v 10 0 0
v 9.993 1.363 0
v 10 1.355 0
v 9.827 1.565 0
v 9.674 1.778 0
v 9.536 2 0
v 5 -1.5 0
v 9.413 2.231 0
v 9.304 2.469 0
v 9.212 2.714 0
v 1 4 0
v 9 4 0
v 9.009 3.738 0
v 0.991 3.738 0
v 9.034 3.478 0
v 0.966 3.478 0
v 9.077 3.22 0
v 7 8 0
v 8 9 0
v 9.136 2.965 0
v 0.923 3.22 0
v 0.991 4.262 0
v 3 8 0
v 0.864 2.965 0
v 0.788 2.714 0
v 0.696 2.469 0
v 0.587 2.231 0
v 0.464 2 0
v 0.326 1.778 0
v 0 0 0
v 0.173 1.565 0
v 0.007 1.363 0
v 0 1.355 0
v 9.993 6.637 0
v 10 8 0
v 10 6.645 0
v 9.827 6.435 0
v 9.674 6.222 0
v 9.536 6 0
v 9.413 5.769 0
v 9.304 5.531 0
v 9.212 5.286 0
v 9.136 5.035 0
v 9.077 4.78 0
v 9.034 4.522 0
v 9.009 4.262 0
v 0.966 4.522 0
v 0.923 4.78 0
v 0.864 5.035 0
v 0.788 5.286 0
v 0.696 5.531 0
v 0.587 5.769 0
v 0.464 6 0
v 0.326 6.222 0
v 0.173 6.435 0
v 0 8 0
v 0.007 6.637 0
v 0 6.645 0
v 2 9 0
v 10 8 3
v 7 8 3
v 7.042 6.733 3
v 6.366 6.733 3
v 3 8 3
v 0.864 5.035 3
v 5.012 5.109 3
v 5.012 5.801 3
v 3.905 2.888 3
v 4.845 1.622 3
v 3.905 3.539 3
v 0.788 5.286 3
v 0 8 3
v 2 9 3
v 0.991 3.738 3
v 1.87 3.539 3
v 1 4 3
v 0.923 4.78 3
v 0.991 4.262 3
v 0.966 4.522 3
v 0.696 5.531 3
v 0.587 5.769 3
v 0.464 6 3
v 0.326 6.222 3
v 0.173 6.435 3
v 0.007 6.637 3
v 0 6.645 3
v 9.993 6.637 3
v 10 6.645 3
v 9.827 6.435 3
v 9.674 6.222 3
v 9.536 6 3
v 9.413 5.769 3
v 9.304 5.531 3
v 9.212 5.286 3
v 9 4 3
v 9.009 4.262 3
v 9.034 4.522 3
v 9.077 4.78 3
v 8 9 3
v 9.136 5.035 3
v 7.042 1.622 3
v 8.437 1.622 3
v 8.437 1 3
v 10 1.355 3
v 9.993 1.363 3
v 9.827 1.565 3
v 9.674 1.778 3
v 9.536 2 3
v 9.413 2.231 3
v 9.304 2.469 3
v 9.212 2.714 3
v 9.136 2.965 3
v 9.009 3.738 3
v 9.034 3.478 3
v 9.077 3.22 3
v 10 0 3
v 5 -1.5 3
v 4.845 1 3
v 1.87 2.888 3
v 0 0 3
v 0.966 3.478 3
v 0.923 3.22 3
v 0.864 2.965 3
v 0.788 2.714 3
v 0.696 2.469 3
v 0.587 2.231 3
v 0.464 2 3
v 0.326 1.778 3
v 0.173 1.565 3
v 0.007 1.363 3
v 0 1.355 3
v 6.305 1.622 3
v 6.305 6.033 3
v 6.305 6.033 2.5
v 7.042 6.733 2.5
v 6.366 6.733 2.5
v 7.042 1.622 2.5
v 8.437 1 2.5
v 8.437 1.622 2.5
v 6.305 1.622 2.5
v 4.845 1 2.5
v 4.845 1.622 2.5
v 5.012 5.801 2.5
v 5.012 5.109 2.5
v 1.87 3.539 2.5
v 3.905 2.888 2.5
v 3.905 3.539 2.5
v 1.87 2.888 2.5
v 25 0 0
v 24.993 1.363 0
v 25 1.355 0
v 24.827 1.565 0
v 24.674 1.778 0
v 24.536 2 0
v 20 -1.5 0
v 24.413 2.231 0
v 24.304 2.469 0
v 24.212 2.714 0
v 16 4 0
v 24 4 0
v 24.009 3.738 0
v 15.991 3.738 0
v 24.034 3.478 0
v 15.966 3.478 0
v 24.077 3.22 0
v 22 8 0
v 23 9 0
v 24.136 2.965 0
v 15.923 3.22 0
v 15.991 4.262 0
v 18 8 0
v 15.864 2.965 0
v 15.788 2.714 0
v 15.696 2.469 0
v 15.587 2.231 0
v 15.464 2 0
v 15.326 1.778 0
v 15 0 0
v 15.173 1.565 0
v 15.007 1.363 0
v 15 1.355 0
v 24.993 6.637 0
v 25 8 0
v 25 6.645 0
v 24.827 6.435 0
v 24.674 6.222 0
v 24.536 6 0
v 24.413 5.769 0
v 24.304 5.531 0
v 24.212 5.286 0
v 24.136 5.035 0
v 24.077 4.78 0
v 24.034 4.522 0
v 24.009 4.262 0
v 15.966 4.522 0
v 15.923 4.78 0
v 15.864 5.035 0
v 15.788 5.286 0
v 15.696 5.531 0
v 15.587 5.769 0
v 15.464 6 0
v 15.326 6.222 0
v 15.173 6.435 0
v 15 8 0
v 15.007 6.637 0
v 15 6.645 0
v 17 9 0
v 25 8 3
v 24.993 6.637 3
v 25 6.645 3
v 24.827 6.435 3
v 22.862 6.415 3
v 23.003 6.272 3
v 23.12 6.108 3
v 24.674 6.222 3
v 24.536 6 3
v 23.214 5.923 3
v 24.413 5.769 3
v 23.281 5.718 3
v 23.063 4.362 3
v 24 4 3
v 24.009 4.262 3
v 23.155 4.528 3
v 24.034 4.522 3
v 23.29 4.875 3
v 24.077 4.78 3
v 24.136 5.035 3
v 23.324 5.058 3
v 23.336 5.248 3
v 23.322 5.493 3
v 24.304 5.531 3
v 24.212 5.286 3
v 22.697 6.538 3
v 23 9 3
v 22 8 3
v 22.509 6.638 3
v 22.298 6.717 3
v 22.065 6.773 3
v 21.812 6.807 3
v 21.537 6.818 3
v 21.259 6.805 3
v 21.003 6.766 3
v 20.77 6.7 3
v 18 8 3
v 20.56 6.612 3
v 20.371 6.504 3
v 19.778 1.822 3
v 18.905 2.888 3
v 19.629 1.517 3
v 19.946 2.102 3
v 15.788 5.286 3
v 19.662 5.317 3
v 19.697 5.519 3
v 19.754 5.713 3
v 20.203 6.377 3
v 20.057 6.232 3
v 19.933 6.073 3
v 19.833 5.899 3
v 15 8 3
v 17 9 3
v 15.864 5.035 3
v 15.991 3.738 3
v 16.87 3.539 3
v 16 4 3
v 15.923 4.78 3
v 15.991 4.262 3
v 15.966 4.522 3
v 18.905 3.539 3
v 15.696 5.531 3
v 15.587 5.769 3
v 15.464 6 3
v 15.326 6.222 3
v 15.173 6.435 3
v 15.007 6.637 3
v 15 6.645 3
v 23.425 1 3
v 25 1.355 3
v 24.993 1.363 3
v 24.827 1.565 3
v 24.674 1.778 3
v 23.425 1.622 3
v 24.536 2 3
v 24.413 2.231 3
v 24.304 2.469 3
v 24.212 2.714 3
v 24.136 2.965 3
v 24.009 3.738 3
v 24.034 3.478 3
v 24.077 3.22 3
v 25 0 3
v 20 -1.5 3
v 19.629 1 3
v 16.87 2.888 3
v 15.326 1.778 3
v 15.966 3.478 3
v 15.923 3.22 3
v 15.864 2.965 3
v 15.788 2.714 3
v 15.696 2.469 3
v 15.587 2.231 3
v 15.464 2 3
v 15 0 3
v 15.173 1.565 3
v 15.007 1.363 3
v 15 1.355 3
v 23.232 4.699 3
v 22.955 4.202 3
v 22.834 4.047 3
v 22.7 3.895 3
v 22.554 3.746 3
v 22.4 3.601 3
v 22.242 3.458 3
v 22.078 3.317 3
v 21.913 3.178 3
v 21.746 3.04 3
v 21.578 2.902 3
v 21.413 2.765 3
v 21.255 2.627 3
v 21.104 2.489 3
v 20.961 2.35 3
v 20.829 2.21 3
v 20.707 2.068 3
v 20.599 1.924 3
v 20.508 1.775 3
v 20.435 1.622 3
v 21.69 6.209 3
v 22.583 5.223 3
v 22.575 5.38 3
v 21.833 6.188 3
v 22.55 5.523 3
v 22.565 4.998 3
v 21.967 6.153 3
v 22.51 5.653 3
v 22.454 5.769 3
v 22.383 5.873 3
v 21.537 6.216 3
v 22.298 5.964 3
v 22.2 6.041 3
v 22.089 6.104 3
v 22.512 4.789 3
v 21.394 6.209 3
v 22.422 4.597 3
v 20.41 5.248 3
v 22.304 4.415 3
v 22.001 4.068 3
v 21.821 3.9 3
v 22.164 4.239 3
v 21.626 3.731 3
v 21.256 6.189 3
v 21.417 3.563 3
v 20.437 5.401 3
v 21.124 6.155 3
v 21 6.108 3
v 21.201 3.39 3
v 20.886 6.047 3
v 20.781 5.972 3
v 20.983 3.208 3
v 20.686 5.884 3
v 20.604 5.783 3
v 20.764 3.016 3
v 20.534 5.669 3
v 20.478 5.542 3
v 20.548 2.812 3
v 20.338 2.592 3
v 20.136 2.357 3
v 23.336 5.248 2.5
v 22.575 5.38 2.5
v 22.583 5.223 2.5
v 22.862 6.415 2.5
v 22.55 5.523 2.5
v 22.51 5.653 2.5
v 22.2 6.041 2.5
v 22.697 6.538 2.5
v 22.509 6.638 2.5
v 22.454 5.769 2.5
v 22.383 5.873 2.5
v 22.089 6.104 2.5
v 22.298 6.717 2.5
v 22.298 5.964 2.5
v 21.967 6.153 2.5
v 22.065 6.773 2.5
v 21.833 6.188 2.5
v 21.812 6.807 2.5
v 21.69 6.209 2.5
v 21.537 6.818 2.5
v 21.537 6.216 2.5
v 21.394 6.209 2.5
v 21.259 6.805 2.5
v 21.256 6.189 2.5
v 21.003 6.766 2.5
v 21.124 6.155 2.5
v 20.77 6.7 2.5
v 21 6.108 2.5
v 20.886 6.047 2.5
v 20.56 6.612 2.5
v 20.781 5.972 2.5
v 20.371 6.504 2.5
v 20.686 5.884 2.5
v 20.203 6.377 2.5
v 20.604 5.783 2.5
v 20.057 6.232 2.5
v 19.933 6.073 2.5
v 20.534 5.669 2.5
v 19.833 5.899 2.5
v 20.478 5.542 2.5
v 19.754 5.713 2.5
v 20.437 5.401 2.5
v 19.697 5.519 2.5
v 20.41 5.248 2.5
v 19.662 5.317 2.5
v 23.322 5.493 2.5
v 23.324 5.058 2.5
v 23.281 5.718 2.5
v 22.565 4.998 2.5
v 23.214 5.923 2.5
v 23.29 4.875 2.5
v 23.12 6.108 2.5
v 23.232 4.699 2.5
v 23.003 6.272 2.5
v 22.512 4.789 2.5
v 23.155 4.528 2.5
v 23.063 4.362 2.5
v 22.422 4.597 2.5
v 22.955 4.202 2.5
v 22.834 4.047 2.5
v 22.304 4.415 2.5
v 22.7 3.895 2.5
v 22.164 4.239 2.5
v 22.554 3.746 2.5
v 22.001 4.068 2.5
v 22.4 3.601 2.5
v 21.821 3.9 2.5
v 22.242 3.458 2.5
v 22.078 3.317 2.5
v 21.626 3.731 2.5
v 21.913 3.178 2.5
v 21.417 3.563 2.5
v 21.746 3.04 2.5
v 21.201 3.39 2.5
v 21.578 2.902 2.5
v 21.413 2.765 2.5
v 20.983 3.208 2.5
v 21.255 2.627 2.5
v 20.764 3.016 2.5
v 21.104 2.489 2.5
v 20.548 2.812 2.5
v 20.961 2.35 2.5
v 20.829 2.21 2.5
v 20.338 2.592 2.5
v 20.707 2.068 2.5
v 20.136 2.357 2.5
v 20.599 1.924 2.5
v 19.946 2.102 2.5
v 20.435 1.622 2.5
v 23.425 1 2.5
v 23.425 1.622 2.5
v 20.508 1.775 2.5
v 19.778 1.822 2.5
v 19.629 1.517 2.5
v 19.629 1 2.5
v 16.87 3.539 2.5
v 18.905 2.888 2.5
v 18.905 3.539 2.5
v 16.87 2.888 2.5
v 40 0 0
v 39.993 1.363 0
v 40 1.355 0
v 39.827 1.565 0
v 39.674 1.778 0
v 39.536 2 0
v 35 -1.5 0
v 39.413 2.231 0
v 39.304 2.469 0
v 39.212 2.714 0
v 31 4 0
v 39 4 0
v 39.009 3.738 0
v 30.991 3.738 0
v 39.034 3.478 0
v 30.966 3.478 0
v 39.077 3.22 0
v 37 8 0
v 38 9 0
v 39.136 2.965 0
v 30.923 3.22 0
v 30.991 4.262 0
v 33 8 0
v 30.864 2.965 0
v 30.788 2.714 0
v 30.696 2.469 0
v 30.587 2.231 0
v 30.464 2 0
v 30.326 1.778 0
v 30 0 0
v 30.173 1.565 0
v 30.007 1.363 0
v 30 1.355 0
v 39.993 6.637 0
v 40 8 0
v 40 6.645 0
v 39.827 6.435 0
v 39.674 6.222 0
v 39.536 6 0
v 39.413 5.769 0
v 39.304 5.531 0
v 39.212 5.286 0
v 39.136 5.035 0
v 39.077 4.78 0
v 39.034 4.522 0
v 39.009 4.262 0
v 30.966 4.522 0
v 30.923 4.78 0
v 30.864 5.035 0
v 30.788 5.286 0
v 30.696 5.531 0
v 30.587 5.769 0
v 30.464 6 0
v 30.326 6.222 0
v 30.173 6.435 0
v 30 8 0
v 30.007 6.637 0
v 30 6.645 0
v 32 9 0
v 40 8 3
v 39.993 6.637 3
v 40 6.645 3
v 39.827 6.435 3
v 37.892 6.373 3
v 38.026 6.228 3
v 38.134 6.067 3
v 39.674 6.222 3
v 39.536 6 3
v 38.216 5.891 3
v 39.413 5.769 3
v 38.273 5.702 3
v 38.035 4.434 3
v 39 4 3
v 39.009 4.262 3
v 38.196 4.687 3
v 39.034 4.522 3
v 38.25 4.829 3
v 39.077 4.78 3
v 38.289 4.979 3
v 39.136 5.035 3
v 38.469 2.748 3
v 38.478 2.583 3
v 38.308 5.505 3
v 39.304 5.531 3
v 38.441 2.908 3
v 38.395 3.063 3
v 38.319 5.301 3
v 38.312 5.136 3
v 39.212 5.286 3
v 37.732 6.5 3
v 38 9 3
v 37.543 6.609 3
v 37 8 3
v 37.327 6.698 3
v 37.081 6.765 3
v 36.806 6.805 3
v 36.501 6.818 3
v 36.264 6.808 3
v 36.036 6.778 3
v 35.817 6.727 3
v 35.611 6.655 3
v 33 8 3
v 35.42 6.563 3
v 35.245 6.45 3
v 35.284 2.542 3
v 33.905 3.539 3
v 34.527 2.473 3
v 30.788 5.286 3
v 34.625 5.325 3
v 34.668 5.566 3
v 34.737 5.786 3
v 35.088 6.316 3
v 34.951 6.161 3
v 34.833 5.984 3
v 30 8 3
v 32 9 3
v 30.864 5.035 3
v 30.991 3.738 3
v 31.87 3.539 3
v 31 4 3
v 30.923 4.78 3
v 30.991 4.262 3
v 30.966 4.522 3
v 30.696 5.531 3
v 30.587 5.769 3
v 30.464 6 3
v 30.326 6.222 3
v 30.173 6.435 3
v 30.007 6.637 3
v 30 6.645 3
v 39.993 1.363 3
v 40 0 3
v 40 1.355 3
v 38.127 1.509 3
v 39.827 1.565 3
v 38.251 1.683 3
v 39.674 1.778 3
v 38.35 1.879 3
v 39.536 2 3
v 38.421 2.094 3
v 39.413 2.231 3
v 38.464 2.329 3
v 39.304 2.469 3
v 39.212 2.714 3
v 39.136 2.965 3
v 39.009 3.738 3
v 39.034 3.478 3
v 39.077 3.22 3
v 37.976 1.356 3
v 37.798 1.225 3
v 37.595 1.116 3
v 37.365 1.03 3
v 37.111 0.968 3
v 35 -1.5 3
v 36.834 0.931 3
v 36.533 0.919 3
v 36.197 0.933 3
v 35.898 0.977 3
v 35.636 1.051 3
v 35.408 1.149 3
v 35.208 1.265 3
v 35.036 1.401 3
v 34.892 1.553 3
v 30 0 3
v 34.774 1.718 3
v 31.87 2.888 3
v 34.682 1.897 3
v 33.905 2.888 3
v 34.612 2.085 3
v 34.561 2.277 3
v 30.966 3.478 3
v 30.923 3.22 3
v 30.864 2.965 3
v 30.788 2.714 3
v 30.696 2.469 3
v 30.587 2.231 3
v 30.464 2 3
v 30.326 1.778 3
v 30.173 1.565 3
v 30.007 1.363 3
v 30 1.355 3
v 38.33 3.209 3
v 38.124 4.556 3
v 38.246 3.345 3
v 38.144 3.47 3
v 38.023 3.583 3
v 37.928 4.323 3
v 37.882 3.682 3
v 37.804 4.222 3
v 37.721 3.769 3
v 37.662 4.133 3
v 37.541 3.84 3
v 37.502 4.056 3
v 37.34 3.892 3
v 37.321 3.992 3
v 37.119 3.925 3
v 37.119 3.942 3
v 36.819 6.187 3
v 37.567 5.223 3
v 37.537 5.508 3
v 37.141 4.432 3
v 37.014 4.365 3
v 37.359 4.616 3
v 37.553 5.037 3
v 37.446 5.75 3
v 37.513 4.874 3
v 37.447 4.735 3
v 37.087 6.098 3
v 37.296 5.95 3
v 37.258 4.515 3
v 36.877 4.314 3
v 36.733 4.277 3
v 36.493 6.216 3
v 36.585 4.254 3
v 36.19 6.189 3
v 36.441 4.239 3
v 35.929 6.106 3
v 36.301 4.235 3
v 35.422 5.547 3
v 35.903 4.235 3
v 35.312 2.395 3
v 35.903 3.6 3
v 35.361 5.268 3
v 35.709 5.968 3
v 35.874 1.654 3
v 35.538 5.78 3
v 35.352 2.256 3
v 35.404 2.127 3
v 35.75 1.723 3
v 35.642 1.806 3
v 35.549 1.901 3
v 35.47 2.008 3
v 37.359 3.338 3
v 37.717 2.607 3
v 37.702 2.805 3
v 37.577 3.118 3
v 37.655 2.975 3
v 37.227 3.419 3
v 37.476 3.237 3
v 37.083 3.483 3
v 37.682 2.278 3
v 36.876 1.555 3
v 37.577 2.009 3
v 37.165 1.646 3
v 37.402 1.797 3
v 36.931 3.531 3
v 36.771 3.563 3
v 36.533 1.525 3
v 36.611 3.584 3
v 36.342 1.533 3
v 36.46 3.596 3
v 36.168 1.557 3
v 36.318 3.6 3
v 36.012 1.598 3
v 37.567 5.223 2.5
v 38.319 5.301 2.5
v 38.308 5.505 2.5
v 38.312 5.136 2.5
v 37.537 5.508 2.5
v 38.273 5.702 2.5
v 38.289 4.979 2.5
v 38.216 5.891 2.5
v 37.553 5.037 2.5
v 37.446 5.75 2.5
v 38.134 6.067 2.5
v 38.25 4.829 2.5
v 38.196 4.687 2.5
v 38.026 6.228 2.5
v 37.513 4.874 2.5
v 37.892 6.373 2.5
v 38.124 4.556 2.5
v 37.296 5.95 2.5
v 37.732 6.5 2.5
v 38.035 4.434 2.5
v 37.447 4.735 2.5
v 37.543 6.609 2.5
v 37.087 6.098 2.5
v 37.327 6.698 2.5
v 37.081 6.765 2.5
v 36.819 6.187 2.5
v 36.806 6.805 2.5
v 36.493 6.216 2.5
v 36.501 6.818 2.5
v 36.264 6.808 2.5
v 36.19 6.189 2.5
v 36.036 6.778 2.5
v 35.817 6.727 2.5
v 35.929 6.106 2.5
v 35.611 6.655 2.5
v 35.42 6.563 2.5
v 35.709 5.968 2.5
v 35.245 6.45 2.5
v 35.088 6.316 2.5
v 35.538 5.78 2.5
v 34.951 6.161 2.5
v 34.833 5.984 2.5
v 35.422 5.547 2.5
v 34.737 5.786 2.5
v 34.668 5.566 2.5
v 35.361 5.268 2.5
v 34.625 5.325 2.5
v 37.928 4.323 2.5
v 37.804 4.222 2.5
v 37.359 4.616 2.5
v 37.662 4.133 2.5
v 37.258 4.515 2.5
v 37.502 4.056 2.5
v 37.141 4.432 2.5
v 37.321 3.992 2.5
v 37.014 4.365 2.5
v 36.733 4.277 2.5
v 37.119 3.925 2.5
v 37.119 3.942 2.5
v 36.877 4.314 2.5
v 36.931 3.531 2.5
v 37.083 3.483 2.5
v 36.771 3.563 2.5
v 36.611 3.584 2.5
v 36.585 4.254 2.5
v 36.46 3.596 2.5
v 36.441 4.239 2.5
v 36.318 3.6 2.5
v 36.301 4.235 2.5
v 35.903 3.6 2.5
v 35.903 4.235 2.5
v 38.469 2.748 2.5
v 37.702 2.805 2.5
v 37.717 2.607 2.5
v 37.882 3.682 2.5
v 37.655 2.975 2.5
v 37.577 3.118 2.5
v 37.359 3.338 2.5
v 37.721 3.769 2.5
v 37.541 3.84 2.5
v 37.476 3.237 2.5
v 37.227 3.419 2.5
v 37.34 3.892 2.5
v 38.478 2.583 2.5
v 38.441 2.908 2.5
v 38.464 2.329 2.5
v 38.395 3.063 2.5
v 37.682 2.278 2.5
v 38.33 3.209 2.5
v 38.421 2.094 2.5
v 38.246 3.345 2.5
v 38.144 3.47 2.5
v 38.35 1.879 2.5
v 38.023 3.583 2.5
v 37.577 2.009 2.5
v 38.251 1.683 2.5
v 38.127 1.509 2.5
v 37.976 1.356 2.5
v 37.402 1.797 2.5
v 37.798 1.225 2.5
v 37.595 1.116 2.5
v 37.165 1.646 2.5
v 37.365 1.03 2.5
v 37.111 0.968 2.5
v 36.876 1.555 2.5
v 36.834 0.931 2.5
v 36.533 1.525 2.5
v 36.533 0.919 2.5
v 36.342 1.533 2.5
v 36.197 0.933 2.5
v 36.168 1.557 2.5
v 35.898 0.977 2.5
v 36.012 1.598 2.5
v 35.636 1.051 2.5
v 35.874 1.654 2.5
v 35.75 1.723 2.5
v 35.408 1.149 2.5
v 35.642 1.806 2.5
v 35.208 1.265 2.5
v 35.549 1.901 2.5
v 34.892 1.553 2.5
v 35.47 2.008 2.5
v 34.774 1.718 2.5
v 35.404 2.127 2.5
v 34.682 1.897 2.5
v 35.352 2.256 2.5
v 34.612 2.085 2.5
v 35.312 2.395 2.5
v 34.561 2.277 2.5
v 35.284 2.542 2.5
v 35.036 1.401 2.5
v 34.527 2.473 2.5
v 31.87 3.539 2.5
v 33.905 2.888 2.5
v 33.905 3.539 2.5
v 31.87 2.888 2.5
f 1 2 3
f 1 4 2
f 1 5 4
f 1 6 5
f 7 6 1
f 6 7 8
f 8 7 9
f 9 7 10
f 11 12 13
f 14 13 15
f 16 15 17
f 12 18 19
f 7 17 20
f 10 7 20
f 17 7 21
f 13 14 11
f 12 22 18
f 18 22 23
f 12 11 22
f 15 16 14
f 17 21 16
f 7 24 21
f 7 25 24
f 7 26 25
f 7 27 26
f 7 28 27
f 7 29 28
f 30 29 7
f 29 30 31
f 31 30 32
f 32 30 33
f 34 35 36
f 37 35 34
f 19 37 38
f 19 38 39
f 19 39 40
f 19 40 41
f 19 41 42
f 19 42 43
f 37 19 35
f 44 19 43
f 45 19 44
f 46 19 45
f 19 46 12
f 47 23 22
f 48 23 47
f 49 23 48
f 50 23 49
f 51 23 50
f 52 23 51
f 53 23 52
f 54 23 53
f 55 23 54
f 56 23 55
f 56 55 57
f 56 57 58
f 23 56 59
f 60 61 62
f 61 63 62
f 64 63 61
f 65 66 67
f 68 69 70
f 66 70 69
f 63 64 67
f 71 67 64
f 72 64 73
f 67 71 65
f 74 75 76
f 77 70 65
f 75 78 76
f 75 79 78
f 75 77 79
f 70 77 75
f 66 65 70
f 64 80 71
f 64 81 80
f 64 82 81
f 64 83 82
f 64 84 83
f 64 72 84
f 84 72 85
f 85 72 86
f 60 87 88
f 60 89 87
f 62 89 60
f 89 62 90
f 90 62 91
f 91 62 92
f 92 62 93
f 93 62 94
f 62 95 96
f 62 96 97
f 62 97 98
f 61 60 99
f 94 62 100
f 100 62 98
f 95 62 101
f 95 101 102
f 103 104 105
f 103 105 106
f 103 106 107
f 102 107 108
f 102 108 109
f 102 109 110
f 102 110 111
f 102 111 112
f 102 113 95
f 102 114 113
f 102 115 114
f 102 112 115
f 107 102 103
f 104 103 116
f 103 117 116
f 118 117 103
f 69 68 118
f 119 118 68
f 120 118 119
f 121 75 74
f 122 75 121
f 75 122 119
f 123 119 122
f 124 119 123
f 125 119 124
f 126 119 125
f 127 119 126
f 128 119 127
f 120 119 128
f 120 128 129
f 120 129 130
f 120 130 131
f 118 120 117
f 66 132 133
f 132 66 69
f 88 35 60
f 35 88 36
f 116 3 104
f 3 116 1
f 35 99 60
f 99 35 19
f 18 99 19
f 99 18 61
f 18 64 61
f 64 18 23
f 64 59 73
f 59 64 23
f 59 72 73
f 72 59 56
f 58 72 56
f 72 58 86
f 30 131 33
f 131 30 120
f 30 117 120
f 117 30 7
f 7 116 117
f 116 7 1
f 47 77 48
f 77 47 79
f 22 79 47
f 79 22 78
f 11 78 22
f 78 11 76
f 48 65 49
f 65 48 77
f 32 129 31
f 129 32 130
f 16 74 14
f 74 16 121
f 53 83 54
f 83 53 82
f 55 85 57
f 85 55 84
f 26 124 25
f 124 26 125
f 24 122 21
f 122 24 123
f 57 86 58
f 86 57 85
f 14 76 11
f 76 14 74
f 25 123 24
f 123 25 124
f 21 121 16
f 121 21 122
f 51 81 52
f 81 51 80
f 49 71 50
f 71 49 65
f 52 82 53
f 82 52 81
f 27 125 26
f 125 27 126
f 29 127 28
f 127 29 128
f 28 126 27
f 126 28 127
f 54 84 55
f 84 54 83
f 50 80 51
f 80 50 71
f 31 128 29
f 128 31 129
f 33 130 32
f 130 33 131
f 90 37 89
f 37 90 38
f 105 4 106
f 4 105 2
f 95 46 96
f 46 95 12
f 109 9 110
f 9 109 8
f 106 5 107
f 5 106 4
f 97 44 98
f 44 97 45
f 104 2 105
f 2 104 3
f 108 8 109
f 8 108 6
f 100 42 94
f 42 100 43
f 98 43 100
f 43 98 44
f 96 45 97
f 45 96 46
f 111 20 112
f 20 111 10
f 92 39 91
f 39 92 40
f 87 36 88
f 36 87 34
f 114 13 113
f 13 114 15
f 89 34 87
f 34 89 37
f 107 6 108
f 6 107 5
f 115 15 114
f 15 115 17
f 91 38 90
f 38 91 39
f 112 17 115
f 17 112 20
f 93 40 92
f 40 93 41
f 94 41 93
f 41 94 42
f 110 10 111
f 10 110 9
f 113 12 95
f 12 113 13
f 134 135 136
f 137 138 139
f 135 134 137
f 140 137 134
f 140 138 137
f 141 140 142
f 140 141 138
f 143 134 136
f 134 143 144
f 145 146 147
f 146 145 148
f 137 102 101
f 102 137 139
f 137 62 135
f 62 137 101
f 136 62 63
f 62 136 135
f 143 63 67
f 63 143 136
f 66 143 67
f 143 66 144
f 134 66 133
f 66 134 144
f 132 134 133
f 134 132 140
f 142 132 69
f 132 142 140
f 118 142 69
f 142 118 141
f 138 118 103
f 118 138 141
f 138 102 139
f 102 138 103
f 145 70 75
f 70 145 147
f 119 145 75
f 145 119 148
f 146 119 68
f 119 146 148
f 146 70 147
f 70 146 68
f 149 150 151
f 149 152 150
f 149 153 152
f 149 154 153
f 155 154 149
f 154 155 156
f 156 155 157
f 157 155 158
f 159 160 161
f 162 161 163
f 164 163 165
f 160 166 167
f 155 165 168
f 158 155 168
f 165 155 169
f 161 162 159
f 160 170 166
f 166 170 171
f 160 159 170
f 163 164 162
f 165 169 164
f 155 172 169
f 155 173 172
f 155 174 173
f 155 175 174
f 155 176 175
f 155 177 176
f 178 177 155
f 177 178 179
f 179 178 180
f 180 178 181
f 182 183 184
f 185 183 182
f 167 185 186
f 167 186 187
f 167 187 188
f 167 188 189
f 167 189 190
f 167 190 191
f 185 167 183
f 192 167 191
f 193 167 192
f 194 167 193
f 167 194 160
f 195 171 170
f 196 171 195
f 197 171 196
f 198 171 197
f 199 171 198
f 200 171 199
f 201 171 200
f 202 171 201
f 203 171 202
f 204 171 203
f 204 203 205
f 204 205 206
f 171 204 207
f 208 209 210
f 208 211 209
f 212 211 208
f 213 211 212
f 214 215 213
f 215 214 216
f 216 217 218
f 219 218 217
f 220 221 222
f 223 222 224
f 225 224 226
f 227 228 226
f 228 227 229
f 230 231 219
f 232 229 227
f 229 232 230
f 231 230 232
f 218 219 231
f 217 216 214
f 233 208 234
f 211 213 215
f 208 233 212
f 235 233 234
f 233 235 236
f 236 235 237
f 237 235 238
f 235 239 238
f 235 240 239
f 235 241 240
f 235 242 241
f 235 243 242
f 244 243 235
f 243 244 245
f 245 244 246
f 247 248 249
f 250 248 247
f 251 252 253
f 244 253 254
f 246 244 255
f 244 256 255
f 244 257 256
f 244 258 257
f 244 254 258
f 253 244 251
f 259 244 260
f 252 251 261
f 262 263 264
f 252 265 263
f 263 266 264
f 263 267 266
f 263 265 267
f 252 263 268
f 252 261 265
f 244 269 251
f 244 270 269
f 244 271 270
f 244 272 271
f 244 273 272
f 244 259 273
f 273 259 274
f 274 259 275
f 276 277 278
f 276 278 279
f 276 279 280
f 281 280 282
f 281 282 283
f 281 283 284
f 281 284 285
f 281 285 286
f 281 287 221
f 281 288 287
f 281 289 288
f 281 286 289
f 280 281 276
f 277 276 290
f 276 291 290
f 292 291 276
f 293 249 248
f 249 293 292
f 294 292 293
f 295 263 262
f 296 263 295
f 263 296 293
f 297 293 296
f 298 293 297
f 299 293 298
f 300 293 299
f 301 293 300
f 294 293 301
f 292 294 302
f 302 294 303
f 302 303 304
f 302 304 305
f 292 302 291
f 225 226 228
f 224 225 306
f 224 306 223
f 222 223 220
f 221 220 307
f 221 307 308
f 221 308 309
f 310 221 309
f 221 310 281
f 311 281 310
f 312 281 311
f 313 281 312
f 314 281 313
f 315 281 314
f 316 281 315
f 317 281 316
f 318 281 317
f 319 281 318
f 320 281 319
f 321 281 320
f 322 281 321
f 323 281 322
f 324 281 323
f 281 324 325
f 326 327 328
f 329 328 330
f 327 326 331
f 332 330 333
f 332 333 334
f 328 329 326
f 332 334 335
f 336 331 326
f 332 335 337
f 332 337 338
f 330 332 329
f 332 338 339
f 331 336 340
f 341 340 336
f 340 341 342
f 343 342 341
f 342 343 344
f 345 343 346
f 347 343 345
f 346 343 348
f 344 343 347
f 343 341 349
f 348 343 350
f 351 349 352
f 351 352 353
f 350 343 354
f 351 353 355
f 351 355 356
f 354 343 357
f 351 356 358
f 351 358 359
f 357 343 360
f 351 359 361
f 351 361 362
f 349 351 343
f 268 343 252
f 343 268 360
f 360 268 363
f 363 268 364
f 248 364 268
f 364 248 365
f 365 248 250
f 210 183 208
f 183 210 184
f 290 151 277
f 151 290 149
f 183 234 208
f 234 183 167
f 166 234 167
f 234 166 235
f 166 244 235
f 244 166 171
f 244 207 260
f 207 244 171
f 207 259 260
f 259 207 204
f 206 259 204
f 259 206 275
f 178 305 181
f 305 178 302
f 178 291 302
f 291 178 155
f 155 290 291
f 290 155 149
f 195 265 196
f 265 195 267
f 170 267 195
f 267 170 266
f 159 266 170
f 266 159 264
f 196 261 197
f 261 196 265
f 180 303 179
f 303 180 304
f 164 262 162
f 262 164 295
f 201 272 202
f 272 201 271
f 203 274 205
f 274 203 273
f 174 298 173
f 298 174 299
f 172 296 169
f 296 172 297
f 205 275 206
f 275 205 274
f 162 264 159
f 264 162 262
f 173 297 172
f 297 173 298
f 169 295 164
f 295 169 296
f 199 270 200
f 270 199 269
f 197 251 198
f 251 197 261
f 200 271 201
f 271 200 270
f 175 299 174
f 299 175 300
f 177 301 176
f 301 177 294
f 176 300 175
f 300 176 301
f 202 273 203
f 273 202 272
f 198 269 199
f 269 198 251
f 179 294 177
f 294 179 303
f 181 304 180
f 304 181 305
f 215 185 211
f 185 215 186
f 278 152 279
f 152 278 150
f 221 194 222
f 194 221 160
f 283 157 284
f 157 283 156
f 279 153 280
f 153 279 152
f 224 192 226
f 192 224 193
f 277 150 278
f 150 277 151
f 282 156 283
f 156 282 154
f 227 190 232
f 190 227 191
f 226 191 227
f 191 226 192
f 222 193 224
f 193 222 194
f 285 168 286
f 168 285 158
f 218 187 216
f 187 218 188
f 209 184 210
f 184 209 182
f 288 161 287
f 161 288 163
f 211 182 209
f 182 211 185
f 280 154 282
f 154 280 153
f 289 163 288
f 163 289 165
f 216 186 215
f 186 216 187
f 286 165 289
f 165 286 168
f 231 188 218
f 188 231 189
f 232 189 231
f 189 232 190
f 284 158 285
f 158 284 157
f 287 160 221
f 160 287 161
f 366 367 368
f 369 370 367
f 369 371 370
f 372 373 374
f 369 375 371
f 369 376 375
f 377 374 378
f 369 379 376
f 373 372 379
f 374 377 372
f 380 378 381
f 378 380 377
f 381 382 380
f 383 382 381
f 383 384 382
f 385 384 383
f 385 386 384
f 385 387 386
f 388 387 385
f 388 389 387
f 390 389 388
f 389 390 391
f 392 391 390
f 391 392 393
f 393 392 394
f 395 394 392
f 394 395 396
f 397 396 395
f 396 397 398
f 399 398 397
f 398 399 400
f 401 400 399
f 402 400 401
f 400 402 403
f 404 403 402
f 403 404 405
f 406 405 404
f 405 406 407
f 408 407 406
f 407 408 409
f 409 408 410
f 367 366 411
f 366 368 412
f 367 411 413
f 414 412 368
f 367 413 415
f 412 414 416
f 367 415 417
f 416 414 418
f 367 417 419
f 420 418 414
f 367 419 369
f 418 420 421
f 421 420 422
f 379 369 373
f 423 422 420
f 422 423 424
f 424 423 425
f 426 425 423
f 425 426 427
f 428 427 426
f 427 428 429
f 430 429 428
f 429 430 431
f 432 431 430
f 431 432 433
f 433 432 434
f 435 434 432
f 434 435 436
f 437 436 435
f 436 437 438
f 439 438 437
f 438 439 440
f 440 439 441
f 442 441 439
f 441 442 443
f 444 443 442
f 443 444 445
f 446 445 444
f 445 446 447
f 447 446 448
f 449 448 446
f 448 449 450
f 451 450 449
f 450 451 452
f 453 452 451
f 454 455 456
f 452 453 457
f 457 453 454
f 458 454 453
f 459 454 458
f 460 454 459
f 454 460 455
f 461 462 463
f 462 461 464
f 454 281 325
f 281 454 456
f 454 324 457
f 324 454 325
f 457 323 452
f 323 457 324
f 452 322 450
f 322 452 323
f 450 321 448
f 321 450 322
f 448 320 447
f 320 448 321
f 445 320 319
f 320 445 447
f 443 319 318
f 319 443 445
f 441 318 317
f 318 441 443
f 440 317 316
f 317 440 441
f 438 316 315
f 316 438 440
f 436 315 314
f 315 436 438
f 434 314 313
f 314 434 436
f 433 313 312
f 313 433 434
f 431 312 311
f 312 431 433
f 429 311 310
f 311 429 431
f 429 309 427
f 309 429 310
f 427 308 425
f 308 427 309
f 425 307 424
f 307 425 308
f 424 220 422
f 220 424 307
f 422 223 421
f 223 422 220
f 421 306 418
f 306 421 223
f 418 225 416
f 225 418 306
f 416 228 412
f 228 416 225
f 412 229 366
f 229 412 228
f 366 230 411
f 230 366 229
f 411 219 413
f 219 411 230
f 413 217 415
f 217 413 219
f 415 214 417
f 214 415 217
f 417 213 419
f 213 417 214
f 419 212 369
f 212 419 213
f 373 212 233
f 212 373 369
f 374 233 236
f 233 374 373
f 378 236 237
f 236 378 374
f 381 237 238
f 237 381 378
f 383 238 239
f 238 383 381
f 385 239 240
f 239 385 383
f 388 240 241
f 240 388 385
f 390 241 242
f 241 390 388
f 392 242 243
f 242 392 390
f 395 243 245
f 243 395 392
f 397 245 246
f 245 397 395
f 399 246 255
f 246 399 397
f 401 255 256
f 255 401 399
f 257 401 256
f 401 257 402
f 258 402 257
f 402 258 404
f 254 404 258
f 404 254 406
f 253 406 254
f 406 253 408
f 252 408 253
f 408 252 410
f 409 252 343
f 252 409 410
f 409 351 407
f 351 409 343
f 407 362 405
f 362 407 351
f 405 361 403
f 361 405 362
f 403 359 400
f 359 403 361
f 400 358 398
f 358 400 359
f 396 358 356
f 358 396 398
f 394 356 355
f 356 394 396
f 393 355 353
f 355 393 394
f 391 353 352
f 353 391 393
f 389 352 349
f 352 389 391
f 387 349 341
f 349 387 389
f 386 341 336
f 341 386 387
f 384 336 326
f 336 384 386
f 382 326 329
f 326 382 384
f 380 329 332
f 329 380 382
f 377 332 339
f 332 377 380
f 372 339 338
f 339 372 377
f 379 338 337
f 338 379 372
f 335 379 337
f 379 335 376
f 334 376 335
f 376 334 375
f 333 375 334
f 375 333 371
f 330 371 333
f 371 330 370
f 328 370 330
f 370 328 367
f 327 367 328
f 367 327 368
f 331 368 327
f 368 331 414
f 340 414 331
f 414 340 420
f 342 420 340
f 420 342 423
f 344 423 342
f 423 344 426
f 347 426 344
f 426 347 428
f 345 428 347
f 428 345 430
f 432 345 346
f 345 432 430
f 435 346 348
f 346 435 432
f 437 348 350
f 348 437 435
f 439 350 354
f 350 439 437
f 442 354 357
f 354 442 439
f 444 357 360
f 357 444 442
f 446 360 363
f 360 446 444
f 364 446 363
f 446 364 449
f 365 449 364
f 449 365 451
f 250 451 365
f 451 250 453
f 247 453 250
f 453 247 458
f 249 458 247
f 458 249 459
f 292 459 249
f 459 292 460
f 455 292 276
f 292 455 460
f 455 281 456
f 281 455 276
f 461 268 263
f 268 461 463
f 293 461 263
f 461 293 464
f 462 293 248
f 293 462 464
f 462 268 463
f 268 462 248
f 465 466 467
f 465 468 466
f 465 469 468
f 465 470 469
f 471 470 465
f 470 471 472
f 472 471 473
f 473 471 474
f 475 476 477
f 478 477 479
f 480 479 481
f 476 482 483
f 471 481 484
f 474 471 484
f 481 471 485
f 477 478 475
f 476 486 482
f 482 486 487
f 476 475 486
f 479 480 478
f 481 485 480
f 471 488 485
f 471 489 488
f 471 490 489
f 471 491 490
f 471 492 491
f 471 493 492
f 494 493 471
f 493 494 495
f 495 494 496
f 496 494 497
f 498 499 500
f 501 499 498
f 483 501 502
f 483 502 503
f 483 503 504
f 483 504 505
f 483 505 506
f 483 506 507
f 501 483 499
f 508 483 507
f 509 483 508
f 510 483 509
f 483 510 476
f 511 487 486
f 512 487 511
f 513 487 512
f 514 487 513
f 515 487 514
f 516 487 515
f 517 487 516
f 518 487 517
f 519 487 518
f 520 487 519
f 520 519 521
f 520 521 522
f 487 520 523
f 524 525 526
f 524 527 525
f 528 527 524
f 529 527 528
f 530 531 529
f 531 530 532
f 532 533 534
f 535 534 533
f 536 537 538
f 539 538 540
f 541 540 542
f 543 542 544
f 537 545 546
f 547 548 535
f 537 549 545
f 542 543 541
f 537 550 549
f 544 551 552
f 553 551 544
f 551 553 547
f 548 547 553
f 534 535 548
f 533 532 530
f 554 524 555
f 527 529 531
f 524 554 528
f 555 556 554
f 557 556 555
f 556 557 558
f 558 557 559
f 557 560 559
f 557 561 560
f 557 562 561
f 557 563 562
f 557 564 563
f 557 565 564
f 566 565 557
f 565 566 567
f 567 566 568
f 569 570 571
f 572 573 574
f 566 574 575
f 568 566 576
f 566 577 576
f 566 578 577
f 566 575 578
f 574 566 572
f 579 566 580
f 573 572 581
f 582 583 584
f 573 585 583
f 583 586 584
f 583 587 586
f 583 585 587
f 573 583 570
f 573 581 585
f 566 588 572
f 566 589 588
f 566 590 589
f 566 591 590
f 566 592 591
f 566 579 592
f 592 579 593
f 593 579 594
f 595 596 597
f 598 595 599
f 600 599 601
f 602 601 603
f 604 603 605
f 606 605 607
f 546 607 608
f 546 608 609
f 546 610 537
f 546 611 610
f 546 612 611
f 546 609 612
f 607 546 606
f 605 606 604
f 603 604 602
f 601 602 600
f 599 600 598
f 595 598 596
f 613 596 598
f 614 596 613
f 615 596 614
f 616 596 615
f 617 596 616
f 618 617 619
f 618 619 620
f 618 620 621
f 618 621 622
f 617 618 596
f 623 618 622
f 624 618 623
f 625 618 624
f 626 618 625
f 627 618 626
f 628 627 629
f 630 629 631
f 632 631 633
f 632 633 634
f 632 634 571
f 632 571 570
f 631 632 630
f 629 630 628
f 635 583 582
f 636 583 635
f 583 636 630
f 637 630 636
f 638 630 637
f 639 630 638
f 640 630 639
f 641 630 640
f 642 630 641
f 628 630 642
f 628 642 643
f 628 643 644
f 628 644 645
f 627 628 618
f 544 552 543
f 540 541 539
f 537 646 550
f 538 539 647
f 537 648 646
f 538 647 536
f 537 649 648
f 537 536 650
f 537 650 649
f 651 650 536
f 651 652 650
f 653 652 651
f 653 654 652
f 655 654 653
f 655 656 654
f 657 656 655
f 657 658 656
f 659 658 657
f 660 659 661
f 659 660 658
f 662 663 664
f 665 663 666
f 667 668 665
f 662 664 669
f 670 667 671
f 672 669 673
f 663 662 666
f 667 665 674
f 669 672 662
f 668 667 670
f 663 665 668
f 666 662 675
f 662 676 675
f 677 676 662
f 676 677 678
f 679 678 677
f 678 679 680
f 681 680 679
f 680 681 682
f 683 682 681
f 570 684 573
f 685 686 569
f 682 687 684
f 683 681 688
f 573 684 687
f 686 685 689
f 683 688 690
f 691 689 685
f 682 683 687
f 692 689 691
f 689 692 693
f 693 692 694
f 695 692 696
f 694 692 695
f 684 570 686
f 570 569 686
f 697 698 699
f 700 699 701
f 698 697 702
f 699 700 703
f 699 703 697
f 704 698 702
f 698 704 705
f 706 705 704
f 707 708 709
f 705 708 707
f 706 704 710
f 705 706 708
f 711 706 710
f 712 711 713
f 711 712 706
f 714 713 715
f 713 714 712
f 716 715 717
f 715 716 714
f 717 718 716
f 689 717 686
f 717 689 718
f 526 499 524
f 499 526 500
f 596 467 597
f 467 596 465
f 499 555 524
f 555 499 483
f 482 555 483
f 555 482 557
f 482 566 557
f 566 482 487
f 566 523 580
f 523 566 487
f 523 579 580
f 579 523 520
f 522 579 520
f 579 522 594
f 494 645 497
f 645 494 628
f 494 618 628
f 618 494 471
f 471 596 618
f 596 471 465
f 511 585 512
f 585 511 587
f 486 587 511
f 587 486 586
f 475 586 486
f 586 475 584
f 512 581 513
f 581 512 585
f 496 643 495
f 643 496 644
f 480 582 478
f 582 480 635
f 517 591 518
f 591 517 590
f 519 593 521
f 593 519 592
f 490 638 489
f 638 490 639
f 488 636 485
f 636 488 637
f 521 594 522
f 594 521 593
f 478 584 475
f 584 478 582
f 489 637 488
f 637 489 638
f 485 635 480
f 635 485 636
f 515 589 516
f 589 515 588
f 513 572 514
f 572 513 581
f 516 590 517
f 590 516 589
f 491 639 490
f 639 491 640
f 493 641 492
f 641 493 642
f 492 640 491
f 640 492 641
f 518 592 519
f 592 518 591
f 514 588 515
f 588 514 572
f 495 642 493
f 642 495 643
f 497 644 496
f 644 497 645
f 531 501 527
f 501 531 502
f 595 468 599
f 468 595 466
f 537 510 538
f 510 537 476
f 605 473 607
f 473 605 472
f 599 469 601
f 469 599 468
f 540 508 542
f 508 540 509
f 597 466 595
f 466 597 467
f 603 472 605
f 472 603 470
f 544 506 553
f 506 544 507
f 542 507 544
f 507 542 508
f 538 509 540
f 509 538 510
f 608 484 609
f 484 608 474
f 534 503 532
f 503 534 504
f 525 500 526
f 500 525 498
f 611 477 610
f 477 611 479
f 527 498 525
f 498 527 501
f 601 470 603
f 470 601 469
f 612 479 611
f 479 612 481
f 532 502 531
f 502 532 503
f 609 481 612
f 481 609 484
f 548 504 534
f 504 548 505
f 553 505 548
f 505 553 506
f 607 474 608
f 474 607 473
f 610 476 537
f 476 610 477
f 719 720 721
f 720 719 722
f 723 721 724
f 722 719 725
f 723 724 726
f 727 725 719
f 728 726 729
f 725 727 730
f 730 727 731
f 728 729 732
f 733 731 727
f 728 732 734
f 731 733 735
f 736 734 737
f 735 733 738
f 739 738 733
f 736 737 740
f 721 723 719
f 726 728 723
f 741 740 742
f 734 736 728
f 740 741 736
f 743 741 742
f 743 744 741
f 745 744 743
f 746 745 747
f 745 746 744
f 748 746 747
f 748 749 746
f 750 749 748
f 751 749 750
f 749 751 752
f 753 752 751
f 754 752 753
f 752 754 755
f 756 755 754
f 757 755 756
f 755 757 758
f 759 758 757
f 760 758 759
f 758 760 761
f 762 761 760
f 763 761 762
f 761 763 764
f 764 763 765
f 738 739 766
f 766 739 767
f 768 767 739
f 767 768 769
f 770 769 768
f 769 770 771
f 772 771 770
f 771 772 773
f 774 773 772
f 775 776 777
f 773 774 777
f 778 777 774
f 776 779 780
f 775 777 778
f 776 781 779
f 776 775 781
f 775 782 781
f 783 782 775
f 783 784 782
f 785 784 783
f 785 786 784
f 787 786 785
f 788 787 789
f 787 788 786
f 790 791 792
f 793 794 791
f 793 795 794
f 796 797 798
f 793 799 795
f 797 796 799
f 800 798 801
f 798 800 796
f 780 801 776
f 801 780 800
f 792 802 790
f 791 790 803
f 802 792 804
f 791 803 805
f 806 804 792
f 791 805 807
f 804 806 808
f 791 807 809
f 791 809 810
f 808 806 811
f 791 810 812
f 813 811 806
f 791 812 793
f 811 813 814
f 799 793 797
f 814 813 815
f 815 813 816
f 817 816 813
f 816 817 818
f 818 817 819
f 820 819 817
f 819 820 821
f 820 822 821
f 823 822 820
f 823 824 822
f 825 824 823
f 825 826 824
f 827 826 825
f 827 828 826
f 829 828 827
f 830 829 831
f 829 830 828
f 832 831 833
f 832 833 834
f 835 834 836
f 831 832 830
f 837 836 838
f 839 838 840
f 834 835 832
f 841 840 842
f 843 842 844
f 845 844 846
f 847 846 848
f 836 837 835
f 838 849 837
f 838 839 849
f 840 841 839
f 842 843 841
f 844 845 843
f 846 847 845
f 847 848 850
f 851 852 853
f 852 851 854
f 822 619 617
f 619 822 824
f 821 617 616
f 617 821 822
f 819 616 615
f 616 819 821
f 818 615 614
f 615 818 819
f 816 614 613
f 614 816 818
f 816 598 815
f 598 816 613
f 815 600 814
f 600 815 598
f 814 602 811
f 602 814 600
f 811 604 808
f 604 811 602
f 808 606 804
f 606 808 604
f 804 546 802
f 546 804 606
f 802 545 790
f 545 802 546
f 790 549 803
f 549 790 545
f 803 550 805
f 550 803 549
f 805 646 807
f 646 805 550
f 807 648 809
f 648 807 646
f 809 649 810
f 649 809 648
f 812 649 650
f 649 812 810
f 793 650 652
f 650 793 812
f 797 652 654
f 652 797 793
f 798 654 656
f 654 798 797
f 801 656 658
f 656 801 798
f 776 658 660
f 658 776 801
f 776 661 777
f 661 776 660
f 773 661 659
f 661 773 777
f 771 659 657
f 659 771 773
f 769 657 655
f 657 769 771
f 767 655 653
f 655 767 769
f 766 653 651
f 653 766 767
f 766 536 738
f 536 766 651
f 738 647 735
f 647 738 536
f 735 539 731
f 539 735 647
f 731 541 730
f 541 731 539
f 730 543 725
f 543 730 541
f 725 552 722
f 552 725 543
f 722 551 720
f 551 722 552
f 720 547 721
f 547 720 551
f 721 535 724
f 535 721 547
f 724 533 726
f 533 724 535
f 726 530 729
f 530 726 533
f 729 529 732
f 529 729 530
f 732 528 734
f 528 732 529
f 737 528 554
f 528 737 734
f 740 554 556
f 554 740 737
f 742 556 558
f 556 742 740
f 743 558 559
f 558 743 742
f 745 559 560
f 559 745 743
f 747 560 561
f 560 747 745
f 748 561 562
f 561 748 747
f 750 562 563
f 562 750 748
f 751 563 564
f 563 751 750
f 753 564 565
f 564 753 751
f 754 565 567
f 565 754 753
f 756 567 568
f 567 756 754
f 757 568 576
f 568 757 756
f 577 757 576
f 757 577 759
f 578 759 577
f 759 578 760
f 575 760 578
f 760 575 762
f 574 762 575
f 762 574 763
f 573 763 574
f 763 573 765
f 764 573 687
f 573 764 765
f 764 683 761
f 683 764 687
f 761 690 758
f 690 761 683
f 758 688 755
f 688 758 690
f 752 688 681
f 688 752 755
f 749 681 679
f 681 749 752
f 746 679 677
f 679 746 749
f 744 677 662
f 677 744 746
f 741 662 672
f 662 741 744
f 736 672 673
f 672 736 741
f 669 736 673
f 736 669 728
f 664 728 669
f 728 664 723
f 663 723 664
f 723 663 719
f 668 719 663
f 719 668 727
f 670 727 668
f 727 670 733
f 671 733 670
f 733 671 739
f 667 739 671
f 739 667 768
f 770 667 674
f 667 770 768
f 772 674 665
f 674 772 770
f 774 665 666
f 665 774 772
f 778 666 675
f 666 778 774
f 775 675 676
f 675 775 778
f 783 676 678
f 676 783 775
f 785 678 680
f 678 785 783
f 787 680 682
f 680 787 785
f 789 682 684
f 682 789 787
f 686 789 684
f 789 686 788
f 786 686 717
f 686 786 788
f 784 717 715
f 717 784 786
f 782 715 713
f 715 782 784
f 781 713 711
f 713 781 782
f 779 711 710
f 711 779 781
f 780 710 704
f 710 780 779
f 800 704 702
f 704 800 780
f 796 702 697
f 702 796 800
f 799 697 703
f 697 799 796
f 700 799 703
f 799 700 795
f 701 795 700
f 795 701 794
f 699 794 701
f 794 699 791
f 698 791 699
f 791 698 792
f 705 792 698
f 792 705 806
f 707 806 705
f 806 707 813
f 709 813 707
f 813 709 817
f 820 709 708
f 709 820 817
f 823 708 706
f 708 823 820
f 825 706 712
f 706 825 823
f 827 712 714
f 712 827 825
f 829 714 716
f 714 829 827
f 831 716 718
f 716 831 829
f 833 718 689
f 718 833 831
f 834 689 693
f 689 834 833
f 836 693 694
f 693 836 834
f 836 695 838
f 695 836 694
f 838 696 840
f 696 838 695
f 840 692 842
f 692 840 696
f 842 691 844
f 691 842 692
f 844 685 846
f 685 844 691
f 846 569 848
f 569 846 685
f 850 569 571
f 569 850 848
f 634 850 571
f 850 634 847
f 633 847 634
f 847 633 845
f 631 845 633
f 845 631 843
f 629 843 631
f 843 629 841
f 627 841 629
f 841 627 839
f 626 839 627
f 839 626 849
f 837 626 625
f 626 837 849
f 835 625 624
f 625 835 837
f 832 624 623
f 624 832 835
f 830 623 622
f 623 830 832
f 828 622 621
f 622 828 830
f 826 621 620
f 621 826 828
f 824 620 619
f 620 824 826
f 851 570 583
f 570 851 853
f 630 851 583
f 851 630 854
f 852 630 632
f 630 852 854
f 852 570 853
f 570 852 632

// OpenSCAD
willpower("-1");
translate([15,0,0])
willpower("-2");
translate([30,0,0])
willpower("-3");


module willpower(text) {
    difference() {
        color("blue")
        difference() {
            linear_extrude(3)
            polygon([[0,0],[0,8],[2,9],[3,8],[5,8],[7,8],[8,9],[10,8],[10,0],[5,-1.5]]);
            translate([-3,4,-0.1])
            cylinder(d=8,h=4, $fn=96);
            translate([13,4,-0.1])
            cylinder(d=8,h=4, $fn=96);
        }
        translate([1.5,1,2.5])
        color("gold")
        linear_extrude(1)
        text(text, size=6);
    }
}
